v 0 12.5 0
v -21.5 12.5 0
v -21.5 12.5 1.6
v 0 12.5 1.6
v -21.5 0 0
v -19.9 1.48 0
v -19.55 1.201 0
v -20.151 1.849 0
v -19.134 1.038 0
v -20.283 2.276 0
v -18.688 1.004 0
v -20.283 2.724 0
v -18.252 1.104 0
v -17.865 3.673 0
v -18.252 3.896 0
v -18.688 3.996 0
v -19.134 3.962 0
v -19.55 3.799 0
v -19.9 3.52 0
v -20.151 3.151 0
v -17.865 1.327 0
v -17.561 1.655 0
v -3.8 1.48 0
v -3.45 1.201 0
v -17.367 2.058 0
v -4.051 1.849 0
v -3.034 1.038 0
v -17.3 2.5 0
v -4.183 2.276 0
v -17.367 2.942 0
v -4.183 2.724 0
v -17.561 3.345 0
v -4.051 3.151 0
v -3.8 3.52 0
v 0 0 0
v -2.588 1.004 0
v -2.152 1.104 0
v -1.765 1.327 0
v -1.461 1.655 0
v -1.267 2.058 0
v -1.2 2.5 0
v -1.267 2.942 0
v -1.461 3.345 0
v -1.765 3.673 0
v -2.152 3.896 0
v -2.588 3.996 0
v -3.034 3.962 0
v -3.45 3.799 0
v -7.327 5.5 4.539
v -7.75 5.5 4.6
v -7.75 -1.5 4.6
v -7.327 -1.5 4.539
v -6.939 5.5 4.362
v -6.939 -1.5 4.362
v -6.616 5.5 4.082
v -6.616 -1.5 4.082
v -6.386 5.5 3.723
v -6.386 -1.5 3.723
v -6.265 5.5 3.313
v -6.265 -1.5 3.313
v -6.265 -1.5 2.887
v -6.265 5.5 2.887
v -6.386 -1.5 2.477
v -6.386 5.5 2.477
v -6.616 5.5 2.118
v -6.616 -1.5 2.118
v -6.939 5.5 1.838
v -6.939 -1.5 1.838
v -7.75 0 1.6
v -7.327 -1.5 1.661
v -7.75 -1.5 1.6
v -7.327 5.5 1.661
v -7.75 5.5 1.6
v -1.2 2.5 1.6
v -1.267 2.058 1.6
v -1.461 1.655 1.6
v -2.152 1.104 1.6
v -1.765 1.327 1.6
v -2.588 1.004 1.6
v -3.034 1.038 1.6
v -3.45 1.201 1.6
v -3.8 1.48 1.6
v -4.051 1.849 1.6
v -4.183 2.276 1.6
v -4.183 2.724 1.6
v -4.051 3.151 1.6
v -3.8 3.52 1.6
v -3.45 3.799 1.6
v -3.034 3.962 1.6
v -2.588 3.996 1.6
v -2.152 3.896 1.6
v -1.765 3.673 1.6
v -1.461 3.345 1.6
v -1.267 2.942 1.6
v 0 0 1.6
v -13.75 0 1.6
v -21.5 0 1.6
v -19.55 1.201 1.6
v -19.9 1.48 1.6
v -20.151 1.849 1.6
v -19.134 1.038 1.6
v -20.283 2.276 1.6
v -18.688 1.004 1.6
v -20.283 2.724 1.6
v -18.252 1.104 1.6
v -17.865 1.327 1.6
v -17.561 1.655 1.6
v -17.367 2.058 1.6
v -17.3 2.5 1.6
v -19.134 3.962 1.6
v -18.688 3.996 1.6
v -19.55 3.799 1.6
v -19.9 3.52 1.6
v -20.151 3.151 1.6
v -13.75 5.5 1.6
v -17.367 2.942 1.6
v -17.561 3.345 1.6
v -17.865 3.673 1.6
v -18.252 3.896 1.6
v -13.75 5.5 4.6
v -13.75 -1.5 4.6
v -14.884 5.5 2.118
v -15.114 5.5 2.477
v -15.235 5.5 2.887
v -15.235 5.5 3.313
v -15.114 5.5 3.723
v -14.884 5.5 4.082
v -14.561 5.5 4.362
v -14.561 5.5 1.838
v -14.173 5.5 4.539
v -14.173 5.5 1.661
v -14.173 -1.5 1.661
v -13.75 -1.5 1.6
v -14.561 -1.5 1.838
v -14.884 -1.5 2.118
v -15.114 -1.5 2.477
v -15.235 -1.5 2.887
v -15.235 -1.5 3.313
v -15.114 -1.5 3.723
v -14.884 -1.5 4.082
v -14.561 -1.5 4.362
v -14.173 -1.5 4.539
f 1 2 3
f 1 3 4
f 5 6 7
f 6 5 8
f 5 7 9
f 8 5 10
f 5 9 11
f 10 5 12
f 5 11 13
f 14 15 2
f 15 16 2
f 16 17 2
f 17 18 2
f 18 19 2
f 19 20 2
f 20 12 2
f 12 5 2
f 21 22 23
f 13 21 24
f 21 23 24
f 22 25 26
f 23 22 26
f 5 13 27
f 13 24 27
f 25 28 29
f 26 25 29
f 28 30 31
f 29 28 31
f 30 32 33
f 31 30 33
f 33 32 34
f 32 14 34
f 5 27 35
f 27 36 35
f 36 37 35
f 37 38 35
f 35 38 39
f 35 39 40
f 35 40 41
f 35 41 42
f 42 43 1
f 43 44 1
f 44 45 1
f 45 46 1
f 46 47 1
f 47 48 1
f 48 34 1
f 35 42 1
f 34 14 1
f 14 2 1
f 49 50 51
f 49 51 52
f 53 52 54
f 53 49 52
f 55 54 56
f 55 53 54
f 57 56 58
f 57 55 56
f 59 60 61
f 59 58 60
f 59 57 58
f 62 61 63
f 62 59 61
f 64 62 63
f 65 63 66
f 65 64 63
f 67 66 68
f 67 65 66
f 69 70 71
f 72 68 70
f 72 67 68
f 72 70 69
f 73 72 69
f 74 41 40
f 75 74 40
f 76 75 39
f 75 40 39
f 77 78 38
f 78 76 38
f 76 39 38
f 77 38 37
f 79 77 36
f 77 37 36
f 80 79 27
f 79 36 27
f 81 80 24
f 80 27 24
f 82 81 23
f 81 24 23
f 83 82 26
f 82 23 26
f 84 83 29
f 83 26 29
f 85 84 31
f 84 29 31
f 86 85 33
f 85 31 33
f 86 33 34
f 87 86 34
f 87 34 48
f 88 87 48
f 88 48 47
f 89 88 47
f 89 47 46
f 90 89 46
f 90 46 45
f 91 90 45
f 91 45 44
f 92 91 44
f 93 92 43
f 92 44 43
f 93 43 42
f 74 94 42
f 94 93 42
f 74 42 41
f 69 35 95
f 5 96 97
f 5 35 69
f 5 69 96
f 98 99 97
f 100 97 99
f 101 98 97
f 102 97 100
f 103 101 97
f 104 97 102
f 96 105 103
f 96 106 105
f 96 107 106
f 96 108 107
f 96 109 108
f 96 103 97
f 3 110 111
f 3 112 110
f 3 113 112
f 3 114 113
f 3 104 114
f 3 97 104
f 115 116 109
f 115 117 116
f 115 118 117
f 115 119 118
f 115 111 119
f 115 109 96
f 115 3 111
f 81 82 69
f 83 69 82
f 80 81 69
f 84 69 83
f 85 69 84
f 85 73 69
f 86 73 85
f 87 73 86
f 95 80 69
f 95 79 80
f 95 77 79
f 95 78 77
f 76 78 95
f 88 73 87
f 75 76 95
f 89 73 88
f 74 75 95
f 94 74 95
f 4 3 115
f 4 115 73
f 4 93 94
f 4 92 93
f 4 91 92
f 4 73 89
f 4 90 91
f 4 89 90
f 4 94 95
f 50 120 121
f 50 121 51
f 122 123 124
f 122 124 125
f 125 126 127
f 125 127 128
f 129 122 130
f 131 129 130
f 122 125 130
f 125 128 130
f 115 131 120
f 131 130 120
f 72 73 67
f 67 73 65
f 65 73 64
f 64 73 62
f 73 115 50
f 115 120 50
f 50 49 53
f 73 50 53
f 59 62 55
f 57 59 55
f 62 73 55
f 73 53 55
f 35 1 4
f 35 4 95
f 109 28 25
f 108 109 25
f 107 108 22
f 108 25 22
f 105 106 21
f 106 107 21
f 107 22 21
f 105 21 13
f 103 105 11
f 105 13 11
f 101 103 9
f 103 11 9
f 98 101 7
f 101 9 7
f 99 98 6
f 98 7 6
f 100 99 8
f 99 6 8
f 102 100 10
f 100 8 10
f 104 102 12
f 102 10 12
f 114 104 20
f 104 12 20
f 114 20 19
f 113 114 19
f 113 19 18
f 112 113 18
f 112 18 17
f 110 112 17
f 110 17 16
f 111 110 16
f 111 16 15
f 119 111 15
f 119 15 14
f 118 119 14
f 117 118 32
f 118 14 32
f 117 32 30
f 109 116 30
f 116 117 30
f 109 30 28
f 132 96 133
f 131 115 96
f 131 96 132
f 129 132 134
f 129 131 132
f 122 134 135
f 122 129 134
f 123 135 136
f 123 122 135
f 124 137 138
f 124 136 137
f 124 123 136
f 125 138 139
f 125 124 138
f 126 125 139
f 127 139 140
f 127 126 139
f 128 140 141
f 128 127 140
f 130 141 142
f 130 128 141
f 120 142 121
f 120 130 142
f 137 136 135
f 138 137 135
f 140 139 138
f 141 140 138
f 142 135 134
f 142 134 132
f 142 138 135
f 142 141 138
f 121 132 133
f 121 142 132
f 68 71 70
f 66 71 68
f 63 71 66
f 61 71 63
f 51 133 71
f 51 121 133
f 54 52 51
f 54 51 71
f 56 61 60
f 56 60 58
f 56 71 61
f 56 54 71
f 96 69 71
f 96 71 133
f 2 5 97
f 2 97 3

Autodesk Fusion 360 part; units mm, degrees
sketch "Skizze1" plane through (0, 0, 0) normal (0, 0, 1) x (1, 0, 0)
  line L0 (0, 0) -> (-21.5, 0)
  line L1 (-21.5, 0) -> (-21.5, 12.5)
  line L2 (-21.5, 12.5) -> (0, 12.5)
  line L3 (0, 12.5) -> (0, 0)
  circle A0 centre (-18.8, 2.5) radius 1.5
  circle A1 centre (-2.7, 2.5) radius 1.5
  line L4 (-21.5, 11.23) -> (0, 11.23) construction
  line L5 (-10.75, 12.5) -> (-10.75, 0) construction
  point P0 (-10.75, 11.23)
  dimension "d1" = 21.5
  dimension "d2" = 12.5
  dimension "d3" = 3
  dimension "d4" = 2.7
  dimension "d5" = 2.7
  dimension "d6" = 2.5
  dimension "d7" = 2.5
  dimension "d8" = 1.27
extrude "Extrusion1" add sketch "Skizze1" along normal blind 1.6
sketch "Skizze2" plane through (0, 0, 0) normal (0, -1, 0) x (1, 0, 0)
  line L0 (-21.5, 0) -> (0, 0)
  line L1 (0, 0) -> (0, 1.6)
  line L2 (0, 1.6) -> (-21.5, 1.6)
  line L3 (-21.5, 1.6) -> (-21.5, 0)
  line L4 (-10.75, 0) -> (-10.75, 13.6465) construction
  line L5 (-13.75, 4.6) -> (-7.75, 4.6)
  line L6 (-7.75, 1.6) -> (-13.75, 1.6)
  arc A0 (-13.75, 4.6) -> (-13.75, 1.6) centre (-13.75, 3.1) ccw
  arc A1 (-7.75, 1.6) -> (-7.75, 4.6) centre (-7.75, 3.1) ccw
  point P0 (-10.75, 1.6)
  dimension "d11" = 1.5
  dimension "d12" = 6
extrude "Extrusion2" add sketch "Skizze2" along normal blind 1.5 and the other way blind 5.5 contours L2 L5 L6 A0 A1
sketch "Skizze3" plane through (0, 0, 1.6) normal (0, 0, 1) x (-1, 0, 0)
  line L0 (7.75, -5.5) -> (7.75, 0)
  line L1 (7.75, 0) -> (0, 0)
  line L2 (0, 0) -> (0, -12.5)
  line L3 (0, -12.5) -> (21.5, -12.5)
  line L4 (21.5, -12.5) -> (21.5, 0)
  line L5 (21.5, 0) -> (13.75, 0)
  line L6 (13.75, 0) -> (13.75, -5.5)
  line L7 (13.75, -5.5) -> (7.75, -5.5)
  circle A0 centre (2.7, -2.5) radius 1.5
  circle A1 centre (18.8, -2.5) radius 1.5
  point P0 (10.75, -11.23)
  point P1 (10.75, -11.23)
ref_plane "Arbeitsebene1" through (0, 0, 5.1) normal (0, 0, 1) x (1, 0, 0)
sketch "Skizze4" plane through (0, 0, 5.1) normal (0, 0, 1) x (1, 0, 0)
  point P0 (-10.75, 11.23)
  point P1 (-10.75, 11.23)
equation "d4 = 1.2 mm + 1.5 mm"
equation "d5 = d4"
equation "d7 = d6"
equation "d8 = ( 2.54 / 2 ) * 1 mm"
equation "d12 = 9 mm - 3 mm"
equation "d15 = 7 mm - 1.5 mm"
equation "d17 = 1.6 mm + 3.5 mm"
